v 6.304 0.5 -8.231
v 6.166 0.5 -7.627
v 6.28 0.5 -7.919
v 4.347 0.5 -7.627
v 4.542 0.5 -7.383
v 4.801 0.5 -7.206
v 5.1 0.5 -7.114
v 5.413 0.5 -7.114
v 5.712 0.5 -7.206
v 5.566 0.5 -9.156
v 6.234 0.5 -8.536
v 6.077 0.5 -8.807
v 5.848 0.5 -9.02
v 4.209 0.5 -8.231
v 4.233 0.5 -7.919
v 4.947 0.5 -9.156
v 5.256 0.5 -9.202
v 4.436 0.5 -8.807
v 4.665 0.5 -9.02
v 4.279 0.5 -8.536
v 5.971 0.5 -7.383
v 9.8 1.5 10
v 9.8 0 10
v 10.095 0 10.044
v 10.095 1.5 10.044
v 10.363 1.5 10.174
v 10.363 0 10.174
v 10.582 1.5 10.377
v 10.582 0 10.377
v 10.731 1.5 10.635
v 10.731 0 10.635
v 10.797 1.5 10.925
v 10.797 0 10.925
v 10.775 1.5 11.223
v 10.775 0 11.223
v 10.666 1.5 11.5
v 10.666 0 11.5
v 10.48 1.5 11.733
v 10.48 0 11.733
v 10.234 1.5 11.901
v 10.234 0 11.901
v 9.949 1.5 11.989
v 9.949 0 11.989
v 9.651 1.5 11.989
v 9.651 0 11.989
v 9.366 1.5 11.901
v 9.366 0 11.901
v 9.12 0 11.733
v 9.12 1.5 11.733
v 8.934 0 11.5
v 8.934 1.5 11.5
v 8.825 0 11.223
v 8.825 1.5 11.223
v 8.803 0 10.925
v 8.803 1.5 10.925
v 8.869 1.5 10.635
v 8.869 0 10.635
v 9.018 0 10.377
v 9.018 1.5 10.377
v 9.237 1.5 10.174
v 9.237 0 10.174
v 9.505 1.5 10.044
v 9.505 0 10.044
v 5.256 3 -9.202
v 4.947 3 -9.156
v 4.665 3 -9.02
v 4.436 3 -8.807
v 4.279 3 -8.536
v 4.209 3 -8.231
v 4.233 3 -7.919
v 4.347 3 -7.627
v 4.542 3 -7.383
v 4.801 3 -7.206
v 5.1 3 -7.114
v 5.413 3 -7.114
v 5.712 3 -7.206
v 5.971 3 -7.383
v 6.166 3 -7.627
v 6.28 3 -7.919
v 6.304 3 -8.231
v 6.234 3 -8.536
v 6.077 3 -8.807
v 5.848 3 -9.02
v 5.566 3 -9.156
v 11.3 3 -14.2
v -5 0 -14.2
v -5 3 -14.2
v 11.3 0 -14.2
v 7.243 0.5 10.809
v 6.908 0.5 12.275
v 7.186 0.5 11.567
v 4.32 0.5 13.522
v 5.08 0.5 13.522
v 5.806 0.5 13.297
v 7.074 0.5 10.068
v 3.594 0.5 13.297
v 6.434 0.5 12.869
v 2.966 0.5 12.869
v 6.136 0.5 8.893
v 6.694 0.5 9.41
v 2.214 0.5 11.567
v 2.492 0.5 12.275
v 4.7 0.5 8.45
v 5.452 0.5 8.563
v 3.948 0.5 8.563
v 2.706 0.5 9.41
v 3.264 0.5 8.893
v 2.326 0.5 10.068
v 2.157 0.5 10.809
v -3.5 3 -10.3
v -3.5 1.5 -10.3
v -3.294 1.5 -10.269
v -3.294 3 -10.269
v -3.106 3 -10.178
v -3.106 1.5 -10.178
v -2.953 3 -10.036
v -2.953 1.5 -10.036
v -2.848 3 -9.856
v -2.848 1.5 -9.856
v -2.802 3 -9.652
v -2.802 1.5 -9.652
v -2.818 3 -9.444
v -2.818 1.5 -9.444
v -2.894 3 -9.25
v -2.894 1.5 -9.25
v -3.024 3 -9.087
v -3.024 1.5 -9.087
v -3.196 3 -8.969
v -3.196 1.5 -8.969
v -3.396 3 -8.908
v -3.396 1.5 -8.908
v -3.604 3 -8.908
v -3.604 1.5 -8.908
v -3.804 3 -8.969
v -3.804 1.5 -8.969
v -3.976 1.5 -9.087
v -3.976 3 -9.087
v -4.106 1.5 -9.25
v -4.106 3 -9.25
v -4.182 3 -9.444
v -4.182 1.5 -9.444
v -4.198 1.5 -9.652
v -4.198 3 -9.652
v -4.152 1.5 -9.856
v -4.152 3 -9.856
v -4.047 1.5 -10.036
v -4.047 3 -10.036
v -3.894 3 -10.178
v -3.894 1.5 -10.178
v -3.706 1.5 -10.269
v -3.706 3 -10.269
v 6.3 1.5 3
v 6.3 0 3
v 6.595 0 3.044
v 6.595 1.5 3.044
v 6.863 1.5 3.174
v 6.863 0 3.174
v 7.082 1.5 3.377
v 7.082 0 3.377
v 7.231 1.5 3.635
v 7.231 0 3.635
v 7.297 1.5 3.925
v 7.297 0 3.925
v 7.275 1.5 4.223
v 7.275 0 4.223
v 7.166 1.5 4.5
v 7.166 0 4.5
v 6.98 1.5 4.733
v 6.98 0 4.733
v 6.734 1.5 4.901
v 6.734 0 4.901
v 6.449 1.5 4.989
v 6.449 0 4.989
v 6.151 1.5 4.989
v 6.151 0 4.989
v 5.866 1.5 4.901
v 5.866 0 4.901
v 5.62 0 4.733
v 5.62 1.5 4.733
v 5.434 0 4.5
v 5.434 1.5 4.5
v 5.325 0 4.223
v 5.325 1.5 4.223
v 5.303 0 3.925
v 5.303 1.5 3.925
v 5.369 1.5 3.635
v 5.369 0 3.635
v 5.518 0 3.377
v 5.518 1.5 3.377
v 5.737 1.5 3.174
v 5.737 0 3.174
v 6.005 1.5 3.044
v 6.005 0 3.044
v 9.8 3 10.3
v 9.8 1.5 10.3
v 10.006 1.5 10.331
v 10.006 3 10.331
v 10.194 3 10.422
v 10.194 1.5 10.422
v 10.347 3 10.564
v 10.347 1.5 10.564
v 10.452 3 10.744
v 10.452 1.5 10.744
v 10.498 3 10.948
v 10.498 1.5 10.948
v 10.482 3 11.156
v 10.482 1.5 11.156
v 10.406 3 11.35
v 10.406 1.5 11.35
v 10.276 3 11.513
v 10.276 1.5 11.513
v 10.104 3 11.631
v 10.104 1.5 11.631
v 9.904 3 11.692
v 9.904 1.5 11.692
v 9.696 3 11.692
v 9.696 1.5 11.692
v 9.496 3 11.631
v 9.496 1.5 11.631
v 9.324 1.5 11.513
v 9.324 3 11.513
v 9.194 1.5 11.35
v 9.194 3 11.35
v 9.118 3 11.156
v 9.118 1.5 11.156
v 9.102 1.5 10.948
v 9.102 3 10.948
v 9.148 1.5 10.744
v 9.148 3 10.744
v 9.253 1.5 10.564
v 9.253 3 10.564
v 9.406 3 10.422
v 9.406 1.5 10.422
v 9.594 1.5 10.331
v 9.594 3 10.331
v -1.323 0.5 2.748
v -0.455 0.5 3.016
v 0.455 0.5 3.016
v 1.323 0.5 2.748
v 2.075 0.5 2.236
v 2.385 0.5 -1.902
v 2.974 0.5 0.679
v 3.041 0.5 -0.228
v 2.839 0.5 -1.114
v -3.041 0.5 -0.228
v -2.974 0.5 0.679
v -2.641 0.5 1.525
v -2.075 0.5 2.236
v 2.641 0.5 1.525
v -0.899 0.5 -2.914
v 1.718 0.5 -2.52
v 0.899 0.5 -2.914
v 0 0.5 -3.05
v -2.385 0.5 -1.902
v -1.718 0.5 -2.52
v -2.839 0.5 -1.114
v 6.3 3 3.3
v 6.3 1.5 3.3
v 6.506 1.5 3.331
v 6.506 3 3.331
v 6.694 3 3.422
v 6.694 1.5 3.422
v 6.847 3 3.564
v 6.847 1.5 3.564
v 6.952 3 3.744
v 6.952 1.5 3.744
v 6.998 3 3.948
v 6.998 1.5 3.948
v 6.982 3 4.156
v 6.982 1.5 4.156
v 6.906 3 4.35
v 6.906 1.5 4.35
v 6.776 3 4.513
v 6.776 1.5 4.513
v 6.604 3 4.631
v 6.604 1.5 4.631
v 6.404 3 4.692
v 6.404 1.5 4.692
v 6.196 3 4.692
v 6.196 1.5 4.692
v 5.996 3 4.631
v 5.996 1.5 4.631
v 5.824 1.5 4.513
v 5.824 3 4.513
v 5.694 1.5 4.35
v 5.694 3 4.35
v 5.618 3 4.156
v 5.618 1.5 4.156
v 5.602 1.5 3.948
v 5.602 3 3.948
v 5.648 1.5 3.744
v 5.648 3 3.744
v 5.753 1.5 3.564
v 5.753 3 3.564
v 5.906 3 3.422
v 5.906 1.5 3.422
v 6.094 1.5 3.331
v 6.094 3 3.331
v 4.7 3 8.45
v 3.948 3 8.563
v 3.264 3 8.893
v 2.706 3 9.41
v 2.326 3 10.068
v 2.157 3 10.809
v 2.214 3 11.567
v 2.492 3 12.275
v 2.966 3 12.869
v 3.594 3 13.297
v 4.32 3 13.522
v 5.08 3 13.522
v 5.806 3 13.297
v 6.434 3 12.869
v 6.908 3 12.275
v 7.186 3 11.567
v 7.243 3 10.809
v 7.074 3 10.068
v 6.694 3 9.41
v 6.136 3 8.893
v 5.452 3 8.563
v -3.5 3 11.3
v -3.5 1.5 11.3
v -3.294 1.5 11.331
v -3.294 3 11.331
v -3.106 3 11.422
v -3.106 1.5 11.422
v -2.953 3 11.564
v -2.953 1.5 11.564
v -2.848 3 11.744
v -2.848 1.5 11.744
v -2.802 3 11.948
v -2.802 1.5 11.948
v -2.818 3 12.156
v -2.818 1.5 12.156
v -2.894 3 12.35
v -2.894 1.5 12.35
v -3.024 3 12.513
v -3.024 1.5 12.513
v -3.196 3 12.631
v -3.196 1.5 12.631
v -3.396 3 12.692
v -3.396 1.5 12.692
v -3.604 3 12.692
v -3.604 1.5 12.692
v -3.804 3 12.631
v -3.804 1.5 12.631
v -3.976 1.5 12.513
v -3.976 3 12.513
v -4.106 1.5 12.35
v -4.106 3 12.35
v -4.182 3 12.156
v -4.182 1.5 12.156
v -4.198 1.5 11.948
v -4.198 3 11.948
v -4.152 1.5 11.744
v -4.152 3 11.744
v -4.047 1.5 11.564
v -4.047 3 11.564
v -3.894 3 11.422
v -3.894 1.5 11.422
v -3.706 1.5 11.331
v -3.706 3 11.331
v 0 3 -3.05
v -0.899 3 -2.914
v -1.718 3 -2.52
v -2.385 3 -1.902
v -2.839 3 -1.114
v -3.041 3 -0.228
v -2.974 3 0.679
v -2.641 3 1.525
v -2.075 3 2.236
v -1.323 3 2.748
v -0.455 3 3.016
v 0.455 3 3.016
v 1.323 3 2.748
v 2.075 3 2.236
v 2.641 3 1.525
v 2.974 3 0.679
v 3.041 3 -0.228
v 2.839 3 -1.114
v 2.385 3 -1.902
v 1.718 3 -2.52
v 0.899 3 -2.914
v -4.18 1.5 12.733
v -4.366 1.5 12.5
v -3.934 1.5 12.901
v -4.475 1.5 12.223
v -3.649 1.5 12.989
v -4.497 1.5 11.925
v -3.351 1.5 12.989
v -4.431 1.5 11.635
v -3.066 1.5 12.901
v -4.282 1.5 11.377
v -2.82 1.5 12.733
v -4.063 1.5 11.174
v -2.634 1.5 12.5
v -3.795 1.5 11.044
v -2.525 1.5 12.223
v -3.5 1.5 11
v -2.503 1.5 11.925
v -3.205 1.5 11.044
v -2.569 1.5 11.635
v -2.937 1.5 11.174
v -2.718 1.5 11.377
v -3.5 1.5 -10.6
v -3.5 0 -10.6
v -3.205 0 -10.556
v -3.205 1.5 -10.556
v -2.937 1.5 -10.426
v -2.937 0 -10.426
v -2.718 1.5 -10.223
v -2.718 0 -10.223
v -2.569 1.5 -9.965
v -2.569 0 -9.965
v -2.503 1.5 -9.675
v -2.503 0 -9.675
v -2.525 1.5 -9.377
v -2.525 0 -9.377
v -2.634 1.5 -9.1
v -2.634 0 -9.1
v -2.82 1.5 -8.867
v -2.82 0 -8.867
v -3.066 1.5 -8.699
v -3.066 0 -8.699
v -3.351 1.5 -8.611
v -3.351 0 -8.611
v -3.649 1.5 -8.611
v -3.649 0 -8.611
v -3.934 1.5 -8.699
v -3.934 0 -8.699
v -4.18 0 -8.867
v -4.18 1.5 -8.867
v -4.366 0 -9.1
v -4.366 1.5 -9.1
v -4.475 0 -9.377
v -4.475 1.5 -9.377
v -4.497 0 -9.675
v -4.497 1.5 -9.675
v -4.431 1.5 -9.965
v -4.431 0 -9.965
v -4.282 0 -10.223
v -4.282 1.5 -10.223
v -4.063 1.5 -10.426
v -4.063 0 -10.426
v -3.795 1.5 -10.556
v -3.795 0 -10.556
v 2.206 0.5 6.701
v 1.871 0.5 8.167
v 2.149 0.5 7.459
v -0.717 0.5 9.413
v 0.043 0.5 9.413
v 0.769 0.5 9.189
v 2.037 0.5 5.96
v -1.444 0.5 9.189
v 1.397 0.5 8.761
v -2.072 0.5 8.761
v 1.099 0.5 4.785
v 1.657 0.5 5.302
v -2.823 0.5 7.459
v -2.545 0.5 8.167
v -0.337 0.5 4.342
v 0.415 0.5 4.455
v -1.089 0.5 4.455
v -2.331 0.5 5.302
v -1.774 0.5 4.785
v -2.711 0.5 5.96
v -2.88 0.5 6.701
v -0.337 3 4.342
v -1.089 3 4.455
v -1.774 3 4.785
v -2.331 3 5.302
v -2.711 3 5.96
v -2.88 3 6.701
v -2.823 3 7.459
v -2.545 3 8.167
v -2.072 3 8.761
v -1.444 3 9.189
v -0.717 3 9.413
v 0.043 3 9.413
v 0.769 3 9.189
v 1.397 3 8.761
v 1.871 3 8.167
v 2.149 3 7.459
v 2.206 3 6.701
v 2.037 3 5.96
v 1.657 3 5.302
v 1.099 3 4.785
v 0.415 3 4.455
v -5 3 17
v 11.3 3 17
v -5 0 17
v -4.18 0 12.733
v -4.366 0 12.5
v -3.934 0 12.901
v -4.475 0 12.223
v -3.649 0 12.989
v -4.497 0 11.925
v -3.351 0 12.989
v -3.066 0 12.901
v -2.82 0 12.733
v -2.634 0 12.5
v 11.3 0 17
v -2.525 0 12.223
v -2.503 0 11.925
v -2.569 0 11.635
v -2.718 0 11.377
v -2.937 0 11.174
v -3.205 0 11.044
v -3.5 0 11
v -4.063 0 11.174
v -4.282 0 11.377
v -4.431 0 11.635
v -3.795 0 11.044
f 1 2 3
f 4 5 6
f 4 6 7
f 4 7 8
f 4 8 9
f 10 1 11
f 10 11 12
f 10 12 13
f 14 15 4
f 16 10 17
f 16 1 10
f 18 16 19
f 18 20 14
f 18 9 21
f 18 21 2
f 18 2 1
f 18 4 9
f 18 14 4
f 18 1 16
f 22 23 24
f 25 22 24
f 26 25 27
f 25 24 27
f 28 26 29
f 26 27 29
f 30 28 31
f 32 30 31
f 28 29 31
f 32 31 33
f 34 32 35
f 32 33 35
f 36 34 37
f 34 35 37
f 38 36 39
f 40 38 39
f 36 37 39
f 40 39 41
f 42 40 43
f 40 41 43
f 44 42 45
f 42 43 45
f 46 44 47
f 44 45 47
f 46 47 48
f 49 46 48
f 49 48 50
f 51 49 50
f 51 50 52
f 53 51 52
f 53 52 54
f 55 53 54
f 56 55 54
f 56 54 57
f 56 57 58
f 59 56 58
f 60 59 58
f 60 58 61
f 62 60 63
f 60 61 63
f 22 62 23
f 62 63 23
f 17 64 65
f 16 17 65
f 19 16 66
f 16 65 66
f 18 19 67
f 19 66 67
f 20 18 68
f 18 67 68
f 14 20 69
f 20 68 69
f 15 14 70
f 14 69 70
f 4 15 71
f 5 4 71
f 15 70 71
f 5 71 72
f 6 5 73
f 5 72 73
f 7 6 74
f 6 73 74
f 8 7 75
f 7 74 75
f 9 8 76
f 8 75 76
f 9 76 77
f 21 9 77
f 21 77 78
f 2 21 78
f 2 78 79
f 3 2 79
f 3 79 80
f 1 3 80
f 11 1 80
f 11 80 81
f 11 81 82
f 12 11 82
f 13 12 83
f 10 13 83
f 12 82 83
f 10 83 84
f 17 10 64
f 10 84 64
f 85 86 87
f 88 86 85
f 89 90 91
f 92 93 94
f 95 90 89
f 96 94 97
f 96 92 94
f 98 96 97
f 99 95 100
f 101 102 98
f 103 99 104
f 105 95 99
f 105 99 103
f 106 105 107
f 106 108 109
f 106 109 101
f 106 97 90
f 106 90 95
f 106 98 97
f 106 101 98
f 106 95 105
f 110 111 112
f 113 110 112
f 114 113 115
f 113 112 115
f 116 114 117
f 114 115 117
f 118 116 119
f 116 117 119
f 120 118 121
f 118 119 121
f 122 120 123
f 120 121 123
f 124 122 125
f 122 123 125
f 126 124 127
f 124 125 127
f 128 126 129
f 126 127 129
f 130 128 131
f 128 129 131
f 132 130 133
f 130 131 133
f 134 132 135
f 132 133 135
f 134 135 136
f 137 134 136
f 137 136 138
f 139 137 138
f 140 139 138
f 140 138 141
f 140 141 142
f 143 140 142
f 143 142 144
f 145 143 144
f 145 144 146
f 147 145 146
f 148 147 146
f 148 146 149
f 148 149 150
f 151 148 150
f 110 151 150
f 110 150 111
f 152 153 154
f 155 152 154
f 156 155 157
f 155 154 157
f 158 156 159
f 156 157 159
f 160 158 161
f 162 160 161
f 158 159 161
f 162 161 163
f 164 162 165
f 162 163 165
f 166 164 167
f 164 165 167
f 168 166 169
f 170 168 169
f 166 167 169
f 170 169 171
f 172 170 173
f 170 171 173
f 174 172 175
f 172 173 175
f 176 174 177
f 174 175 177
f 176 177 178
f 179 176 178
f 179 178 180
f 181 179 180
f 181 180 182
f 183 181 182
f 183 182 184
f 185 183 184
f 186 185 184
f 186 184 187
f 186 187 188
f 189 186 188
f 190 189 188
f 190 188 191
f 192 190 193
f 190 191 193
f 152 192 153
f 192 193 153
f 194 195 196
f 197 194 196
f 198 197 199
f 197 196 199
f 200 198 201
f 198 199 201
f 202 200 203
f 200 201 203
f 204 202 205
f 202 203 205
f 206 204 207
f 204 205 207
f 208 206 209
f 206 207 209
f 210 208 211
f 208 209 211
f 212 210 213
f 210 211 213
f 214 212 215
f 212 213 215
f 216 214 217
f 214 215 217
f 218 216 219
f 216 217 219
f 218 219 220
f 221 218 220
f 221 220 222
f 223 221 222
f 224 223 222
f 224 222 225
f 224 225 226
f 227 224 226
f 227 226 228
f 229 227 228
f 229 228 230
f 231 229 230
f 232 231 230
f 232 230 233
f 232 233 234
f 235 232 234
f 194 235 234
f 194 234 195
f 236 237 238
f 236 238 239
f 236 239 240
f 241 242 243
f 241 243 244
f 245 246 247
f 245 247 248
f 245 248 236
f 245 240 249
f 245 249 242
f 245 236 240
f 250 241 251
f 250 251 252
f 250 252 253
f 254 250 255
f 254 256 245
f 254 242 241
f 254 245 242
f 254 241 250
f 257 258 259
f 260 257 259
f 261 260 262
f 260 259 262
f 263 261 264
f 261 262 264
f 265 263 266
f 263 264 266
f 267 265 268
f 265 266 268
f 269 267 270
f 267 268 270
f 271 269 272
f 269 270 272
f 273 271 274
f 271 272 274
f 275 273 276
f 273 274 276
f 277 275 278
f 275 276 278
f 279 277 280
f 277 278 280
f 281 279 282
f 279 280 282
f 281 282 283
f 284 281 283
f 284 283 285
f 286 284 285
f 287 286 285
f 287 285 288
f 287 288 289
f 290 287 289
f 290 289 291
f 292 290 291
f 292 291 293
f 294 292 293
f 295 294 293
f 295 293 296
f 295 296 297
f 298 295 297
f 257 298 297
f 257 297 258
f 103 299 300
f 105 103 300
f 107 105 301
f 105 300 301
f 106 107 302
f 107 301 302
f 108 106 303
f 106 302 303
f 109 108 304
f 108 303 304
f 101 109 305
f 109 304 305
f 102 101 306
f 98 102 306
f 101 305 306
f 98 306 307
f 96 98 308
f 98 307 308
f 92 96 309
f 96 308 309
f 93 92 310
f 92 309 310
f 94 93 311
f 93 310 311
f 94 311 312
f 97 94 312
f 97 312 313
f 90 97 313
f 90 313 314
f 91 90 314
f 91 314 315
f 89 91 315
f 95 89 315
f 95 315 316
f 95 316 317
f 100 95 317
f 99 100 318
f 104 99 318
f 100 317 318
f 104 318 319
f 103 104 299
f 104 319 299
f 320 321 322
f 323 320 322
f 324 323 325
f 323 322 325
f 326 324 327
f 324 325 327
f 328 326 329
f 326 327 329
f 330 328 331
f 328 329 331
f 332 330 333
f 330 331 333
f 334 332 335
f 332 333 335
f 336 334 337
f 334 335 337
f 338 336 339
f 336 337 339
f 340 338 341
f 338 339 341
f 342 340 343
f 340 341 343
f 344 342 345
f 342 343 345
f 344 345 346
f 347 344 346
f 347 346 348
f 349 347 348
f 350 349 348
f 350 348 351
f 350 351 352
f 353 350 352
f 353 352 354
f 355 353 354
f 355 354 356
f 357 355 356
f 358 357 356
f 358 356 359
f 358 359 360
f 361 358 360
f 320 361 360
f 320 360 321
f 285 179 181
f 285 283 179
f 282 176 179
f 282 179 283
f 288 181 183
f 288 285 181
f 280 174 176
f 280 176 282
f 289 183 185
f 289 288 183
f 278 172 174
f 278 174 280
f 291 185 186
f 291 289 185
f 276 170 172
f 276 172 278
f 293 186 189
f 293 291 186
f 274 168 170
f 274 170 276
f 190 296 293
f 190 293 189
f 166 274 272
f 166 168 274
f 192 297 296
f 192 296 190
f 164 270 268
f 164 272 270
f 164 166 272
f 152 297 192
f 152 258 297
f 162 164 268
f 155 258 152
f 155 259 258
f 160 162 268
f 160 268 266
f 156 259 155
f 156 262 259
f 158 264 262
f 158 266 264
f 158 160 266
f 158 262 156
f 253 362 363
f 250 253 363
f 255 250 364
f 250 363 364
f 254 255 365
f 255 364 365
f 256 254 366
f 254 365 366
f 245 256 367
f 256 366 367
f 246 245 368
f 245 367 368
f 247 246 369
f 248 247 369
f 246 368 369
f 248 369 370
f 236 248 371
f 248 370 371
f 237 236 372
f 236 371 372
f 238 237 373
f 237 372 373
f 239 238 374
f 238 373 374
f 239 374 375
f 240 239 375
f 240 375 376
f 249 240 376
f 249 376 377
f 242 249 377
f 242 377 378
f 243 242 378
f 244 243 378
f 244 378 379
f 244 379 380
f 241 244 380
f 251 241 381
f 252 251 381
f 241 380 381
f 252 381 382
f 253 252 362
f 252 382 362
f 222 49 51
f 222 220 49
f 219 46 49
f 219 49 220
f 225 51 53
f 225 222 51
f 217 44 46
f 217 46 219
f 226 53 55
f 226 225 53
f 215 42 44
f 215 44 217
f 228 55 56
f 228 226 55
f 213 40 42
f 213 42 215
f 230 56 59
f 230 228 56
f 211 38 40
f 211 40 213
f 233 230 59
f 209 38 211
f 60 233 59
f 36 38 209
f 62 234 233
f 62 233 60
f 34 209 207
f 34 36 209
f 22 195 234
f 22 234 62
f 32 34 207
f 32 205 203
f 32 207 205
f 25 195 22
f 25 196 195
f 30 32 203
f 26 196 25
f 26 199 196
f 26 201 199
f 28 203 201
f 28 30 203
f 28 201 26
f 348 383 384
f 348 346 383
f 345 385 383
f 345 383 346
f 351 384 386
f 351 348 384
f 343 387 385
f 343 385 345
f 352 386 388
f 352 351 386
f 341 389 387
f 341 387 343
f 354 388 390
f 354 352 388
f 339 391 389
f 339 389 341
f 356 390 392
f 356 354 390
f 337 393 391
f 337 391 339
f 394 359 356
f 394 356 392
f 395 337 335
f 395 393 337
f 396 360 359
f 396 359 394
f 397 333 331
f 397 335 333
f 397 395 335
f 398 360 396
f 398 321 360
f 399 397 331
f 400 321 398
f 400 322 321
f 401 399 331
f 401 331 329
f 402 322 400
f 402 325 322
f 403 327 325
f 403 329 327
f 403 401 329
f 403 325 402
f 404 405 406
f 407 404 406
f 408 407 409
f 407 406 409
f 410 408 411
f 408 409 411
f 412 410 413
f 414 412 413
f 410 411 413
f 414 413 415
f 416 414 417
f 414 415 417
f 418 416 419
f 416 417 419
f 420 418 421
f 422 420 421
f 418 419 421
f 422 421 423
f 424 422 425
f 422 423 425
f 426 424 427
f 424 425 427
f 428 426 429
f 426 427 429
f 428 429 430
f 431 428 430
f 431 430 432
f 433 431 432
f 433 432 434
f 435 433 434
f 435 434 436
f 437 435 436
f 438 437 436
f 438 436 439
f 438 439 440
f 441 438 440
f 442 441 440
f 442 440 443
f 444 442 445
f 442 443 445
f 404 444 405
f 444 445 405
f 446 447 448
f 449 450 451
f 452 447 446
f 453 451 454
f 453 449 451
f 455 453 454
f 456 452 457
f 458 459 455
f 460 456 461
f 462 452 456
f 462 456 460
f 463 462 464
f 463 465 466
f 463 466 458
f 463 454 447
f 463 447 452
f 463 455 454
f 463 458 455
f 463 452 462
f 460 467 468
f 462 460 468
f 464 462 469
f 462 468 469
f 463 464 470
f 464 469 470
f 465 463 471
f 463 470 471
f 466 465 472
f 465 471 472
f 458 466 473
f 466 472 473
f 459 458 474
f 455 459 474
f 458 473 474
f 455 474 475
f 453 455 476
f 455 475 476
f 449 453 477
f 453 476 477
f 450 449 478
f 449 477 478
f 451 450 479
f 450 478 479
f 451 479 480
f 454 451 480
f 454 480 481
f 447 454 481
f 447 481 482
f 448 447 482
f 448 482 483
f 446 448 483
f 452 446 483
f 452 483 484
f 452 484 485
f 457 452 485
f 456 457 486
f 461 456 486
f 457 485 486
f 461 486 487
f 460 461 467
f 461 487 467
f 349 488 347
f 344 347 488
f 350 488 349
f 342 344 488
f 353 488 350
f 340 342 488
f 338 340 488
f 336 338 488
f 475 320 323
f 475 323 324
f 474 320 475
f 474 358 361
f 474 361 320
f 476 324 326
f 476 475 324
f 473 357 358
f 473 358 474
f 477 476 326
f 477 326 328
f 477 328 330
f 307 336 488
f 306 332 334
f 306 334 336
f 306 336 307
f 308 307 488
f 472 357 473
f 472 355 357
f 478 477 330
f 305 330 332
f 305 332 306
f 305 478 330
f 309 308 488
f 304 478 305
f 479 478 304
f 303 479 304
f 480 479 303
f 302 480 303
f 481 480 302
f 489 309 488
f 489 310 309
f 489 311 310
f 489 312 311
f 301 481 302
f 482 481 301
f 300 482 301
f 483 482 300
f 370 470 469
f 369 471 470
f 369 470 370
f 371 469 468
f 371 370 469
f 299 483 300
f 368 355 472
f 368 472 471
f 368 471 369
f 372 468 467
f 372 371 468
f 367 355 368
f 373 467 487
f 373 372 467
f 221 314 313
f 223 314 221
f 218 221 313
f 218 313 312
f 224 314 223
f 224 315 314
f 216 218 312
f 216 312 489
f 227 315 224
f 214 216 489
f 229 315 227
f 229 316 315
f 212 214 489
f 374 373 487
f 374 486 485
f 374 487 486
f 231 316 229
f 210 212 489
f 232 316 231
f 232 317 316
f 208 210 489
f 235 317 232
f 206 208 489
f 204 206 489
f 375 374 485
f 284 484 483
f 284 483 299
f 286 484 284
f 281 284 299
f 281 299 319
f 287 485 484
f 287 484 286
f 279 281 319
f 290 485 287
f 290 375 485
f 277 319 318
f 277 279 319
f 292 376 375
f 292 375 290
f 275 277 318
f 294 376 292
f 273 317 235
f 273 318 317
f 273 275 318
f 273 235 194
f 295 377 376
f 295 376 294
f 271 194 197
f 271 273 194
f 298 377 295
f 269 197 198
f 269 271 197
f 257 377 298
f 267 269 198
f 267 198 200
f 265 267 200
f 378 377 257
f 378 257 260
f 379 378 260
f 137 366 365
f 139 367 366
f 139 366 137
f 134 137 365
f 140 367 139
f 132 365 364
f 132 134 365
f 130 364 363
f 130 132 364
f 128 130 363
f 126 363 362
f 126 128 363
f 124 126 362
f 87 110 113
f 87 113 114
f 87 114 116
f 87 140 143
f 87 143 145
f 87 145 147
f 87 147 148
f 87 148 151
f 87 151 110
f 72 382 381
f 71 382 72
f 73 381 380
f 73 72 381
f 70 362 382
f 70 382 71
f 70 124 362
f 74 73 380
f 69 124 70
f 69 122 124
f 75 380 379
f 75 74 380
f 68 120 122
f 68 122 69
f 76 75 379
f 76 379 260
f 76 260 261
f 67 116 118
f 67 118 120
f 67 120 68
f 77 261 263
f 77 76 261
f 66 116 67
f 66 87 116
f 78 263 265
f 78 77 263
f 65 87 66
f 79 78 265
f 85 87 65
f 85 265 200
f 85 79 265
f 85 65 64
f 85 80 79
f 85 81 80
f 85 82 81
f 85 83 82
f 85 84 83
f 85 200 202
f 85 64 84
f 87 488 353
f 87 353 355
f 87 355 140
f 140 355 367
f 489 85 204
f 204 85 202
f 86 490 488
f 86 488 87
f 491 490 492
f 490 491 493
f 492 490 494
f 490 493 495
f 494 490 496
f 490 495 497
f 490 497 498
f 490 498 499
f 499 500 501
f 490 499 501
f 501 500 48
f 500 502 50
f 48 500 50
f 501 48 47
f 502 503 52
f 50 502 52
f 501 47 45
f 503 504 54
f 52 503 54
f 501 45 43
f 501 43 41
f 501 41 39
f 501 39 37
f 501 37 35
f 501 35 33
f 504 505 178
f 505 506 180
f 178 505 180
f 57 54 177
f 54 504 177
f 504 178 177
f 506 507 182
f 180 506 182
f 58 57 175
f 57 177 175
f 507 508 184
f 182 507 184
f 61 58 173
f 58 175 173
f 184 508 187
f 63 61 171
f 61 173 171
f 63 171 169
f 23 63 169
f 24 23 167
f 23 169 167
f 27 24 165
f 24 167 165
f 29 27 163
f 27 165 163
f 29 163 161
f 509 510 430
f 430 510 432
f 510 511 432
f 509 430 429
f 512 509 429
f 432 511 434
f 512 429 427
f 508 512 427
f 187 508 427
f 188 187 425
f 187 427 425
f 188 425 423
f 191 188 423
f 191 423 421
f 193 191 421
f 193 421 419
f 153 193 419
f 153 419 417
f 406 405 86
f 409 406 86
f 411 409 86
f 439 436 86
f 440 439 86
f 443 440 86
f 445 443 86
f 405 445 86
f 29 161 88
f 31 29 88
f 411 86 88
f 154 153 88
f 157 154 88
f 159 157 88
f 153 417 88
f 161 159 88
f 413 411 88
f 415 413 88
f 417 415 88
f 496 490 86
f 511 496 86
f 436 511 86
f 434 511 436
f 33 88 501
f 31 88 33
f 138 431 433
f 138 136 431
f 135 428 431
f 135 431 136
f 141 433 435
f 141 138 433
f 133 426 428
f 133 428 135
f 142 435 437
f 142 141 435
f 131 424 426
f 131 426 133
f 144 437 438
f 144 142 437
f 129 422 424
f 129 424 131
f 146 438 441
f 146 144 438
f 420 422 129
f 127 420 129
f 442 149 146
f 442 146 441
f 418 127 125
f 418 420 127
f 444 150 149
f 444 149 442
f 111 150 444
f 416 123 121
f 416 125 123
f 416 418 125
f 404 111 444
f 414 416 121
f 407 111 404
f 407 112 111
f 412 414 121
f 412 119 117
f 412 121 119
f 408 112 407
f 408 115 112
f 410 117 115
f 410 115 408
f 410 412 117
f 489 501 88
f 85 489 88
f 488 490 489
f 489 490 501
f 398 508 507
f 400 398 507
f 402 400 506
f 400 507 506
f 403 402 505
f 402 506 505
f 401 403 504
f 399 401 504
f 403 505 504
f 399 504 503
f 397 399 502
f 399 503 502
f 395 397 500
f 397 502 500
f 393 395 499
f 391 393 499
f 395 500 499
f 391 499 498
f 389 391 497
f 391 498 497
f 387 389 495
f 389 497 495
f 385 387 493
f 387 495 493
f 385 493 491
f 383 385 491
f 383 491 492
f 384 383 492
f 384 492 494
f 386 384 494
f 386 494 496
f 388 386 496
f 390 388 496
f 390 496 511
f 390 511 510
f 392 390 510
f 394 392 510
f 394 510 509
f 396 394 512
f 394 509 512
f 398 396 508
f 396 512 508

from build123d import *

# Parameters (mm, degrees)
SKETCH_1_W          = 16.3
SKETCH_1_H          = 31.2
EXTRUDE_1_DEPTH     = 3
CUT_EXTRUDE_START   = 3
SKETCH_1_3_R        = 3.05
SKETCH_1_3_R_2      = 2.55
SKETCH_1_3_R_3      = 1.05
CUT_EXTRUDE_1_DEPTH = 2.5
SKETCH_2_R          = 1
CUT_EXTRUDE_2_DEPTH = 1.5
SKETCH_2_3_R        = 0.7
CUT_EXTRUDE_3_DEPTH = 21.632256299


with BuildPart() as part:
    # 草图1 → 凸台-拉伸1 (new body)
    with BuildSketch(Plane(origin=(0, 0, 0), x_dir=(1, 0, 0), z_dir=(0, 1, 0))):
        with Locations((3.15, -1.4)):
            Rectangle(SKETCH_1_W, SKETCH_1_H)
    extrude(amount=EXTRUDE_1_DEPTH)

    # 草图1<3> → 切除-拉伸1 (cut)
    with BuildSketch(Plane(origin=(0, 0, 0), x_dir=(1, 0, 0), z_dir=(0, 1, 0)).offset(CUT_EXTRUDE_START)):
        with Locations(Location((0, 0, 0), (0, 0, 90))):
            Circle(SKETCH_1_3_R)
        with Locations(Location((4.7, -11, 0), (0, 0, 90))):
            Circle(SKETCH_1_3_R_2)
        with Locations(Location((-0.337099263, -6.891760594, 0), (0, 0, 90))):
            Circle(SKETCH_1_3_R_2)
        with Locations(Location((5.25646039, 8.152277238, 0), (0, 0, 90))):
            Circle(SKETCH_1_3_R_3)
    extrude(amount=-CUT_EXTRUDE_1_DEPTH, mode=Mode.SUBTRACT)

    # 草图2 → 切除-拉伸2 (cut)
    with BuildSketch(Plane.XZ):
        with Locations(Location((9.8, 11, 0), (0, 0, 270))):
            Circle(SKETCH_2_R)
        with Locations(Location((-3.5, 12, 0), (0, 0, 270))):
            Circle(SKETCH_2_R)
        with Locations(Location((6.3, 4, 0), (0, 0, 270))):
            Circle(SKETCH_2_R)
        with Locations(Location((-3.5, -9.6, 0), (0, 0, 270))):
            Circle(SKETCH_2_R)
    extrude(amount=-CUT_EXTRUDE_2_DEPTH, mode=Mode.SUBTRACT)

    # 草图2<3> → 切除-拉伸3 (cut, through all)
    with BuildSketch(Plane.XZ):
        with Locations(Location((9.8, 11, 0), (0, 0, 270))):
            Circle(SKETCH_2_3_R)
        with Locations(Location((-3.5, 12, 0), (0, 0, 270))):
            Circle(SKETCH_2_3_R)
        with Locations(Location((6.3, 4, 0), (0, 0, 270))):
            Circle(SKETCH_2_3_R)
        with Locations(Location((-3.5, -9.6, 0), (0, 0, 270))):
            Circle(SKETCH_2_3_R)
    extrude(amount=-CUT_EXTRUDE_3_DEPTH, mode=Mode.SUBTRACT)


solid = part.part
